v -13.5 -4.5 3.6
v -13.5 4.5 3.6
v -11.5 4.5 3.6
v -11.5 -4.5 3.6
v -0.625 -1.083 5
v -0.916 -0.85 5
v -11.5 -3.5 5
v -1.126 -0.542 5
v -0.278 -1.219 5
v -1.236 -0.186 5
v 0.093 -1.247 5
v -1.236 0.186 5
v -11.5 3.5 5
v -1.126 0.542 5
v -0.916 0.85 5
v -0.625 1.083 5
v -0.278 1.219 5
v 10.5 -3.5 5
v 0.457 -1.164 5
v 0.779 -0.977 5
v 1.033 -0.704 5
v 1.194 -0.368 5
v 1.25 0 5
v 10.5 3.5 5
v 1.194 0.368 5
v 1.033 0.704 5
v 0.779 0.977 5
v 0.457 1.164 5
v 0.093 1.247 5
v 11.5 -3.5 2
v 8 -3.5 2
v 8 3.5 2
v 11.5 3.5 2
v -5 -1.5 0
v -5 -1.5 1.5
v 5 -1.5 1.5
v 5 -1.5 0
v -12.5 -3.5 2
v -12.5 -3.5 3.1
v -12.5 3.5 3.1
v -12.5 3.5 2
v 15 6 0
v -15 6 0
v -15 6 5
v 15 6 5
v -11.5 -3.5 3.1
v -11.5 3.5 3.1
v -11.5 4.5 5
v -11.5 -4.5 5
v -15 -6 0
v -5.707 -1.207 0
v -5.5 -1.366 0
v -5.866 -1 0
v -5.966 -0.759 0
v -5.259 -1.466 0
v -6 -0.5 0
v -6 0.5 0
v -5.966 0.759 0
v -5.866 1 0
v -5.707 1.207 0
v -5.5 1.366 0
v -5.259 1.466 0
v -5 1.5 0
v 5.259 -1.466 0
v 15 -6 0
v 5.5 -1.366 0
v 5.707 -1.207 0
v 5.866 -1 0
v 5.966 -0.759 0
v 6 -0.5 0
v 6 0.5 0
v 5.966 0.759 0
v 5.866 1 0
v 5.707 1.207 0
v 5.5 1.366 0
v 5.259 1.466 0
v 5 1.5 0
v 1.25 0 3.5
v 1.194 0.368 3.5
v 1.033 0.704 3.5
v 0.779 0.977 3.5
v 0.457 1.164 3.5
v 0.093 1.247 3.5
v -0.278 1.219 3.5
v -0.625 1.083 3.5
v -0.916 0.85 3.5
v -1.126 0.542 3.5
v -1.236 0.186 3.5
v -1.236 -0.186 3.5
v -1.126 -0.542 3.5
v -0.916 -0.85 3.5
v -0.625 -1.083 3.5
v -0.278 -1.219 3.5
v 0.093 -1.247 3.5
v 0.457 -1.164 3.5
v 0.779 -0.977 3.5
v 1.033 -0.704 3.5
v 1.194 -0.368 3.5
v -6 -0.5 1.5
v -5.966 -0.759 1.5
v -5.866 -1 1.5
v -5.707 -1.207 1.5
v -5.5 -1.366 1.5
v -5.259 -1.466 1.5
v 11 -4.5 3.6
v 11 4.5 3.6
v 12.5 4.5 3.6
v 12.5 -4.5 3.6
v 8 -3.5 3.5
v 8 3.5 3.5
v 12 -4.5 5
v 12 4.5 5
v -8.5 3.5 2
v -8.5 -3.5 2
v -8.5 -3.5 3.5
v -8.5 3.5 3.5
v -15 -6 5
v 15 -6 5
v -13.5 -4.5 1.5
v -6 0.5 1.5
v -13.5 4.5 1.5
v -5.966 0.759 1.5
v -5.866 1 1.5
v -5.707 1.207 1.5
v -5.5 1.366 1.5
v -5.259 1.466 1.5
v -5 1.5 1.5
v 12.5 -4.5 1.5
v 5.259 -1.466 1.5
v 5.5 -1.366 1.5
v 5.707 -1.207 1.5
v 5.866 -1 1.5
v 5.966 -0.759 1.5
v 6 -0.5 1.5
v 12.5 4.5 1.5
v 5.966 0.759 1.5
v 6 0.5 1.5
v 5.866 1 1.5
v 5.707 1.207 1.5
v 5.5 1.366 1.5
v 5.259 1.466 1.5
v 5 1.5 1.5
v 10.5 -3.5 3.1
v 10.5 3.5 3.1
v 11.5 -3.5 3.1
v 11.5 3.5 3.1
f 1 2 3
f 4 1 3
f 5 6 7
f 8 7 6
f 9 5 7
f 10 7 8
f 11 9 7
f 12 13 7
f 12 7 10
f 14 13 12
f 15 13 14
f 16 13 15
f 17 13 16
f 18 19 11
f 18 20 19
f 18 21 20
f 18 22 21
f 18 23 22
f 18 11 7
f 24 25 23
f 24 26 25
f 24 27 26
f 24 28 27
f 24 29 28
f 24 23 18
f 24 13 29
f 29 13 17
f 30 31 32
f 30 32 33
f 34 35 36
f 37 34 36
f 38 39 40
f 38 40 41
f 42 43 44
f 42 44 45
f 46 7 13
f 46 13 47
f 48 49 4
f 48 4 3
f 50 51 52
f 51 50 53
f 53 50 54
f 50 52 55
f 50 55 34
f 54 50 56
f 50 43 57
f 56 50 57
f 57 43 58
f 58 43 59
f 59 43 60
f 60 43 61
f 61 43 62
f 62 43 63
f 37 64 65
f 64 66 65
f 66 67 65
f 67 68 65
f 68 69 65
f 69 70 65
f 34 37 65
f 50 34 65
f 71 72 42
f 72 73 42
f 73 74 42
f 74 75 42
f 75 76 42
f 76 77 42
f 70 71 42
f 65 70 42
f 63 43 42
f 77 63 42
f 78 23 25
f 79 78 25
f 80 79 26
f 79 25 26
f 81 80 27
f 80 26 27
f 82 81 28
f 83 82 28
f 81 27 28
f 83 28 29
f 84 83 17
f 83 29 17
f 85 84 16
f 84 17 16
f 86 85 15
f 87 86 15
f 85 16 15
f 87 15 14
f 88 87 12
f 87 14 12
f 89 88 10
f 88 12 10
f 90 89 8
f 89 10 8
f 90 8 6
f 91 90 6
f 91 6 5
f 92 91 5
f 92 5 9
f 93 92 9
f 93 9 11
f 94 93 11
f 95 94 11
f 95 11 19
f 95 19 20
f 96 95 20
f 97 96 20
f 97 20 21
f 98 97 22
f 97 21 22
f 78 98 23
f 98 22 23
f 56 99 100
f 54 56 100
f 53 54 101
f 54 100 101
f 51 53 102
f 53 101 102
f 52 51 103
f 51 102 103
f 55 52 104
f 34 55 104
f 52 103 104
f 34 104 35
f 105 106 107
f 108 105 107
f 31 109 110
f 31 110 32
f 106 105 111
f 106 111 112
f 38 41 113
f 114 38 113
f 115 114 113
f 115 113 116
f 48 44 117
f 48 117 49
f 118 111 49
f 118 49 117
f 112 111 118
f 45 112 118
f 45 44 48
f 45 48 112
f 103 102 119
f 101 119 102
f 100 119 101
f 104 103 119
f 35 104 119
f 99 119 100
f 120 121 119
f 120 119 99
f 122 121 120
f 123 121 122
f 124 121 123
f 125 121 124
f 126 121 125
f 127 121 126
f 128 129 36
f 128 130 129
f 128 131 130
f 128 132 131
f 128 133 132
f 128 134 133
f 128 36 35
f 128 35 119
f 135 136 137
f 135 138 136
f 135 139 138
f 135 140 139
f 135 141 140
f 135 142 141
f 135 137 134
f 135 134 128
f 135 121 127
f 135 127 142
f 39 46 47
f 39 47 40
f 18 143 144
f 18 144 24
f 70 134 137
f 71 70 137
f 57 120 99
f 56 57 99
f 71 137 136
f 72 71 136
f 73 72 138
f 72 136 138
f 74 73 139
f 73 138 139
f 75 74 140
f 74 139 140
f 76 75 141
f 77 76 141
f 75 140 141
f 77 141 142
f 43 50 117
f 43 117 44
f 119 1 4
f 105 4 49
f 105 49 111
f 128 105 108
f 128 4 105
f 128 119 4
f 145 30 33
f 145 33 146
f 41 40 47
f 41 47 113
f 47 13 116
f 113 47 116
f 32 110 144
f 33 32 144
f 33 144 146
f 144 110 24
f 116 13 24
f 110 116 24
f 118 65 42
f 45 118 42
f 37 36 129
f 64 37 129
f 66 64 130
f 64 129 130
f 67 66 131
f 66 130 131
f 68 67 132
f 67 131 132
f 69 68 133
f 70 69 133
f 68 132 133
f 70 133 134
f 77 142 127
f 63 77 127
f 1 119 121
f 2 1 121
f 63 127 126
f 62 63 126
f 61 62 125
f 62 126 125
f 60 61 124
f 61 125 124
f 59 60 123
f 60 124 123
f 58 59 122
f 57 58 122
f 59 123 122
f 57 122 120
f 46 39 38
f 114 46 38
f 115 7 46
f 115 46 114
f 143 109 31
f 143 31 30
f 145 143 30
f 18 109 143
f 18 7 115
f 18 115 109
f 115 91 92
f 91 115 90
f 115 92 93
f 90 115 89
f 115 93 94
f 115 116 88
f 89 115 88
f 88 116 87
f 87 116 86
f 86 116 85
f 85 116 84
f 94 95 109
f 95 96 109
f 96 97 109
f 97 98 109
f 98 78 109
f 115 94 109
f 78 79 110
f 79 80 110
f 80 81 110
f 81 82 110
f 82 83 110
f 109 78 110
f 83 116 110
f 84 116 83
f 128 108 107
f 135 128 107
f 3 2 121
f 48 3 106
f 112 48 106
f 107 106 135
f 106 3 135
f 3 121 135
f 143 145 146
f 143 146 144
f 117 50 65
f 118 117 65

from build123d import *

# Parameters (mm, degrees)
F0_W      = 30
F0_H      = 12
F1_DEPTH  = 5
F2_T      = -1.5
F3_W      = 2
F3_H      = 9
F4_DEPTH  = 1.4
F5_W      = 1
F5_H      = 9
F6_DEPTH  = 3.5
F8_DEPTH  = 1.501
F9_W      = 1.5
F9_H      = 9
F10_DEPTH = 1.4
F11_SIZE2 = 1.39999
F11_SIZE  = 0.99999
F12_W     = 22
F12_H     = 7
F12_R     = 1.25
F13_DEPTH = 1.5
F15_DEPTH = 7
F17_DEPTH = 7


# Not quite as in the source:
# - a fillet or chamfer is up to 0.001 mm smaller than in the source, because OpenCascade refuses the exact size


with BuildPart() as f1:
    # F0 (on Top) → F1 (new body)
    with BuildSketch(Plane.XY):
        Rectangle(F0_W, F0_H)
    extrude(amount=F1_DEPTH)

    # F2
    f2_openings = [f1.faces().sort_by_distance(p)[0] for p in [
        (0, 0, 5),
    ]]
    offset(amount=F2_T, openings=f2_openings)

    # F3 (on face) → F4 (join)
    with BuildSketch(Plane.XY.offset(5)):
        with Locations((-12.5, 0)):
            Rectangle(F3_W, F3_H)
    extrude(amount=-F4_DEPTH)

    # F5 (on face) → F6 (join, through all)
    with BuildSketch(Plane.XY.offset(5)):
        with Locations((13, 0)):
            Rectangle(F5_W, F5_H)
    extrude(amount=-F6_DEPTH)

    # F7 (on face) → F8 (cut, through all)
    with BuildSketch(Plane.XY.offset(1.5)):
        with BuildLine():
            Line((5, 1.5), (-5, 1.5))
            ThreePointArc((-5, 1.5), (-5.7071067812, 1.2071067812), (-6, 0.5))
            Line((-6, 0.5), (-6, -0.5))
            ThreePointArc((-6, -0.5), (-5.7071067812, -1.2071067812), (-5, -1.5))
            Line((-5, -1.5), (5, -1.5))
            ThreePointArc((5, -1.5), (5.7071067812, -1.2071067812), (6, -0.5))
            Line((6, -0.5), (6, 0.5))
            ThreePointArc((6, 0.5), (5.7071067812, 1.2071067812), (5, 1.5))
        make_face()
    extrude(amount=-F8_DEPTH, mode=Mode.SUBTRACT)

    # F9 (on face) → F10 (join)
    with BuildSketch(Plane.XY.offset(5)):
        with Locations((11.75, 0)):
            Rectangle(F9_W, F9_H)
    extrude(amount=-F10_DEPTH)

    # F11 (size 1 and 1.4 in the source; OpenCascade refuses exactly that, so slightly less here)
    f11_edges = [f1.edges().sort_by_distance(p)[0] for p in [
        (11, 0, 5),
    ]]
    f11_side = f1.faces().sort_by_distance((0, 5.67689, 5))[0]
    chamfer(f11_edges, length=F11_SIZE, length2=F11_SIZE2, reference=f11_side)


with BuildPart() as f13:
    # F12 (on face) → F13 (new body)
    with BuildSketch(Plane.XY.offset(5)):
        with Locations((-0.5, 0)):
            Rectangle(F12_W, F12_H)
        Circle(F12_R, mode=Mode.SUBTRACT)
    extrude(amount=-F13_DEPTH)

    # F14 (on face) → F15 (join, through all)
    with BuildSketch(Plane.XZ.offset(3.5)):
        Polygon((-8.5, 3.5), (-11.5, 3.5), (-11.5, 3.1), (-12.5, 3.1), (-12.5, 2), (-8.5, 2), align=None)
    extrude(amount=-F15_DEPTH)

    # F16 (on face) → F17 (join, through all)
    with BuildSketch(Plane.XZ.offset(3.5)):
        Polygon((10.5, 3.1), (10.5, 3.5), (8, 3.5), (8, 2), (11.5, 2), (11.5, 3.1), align=None)
    extrude(amount=-F17_DEPTH)


solid = Compound([f1.part, f13.part])
